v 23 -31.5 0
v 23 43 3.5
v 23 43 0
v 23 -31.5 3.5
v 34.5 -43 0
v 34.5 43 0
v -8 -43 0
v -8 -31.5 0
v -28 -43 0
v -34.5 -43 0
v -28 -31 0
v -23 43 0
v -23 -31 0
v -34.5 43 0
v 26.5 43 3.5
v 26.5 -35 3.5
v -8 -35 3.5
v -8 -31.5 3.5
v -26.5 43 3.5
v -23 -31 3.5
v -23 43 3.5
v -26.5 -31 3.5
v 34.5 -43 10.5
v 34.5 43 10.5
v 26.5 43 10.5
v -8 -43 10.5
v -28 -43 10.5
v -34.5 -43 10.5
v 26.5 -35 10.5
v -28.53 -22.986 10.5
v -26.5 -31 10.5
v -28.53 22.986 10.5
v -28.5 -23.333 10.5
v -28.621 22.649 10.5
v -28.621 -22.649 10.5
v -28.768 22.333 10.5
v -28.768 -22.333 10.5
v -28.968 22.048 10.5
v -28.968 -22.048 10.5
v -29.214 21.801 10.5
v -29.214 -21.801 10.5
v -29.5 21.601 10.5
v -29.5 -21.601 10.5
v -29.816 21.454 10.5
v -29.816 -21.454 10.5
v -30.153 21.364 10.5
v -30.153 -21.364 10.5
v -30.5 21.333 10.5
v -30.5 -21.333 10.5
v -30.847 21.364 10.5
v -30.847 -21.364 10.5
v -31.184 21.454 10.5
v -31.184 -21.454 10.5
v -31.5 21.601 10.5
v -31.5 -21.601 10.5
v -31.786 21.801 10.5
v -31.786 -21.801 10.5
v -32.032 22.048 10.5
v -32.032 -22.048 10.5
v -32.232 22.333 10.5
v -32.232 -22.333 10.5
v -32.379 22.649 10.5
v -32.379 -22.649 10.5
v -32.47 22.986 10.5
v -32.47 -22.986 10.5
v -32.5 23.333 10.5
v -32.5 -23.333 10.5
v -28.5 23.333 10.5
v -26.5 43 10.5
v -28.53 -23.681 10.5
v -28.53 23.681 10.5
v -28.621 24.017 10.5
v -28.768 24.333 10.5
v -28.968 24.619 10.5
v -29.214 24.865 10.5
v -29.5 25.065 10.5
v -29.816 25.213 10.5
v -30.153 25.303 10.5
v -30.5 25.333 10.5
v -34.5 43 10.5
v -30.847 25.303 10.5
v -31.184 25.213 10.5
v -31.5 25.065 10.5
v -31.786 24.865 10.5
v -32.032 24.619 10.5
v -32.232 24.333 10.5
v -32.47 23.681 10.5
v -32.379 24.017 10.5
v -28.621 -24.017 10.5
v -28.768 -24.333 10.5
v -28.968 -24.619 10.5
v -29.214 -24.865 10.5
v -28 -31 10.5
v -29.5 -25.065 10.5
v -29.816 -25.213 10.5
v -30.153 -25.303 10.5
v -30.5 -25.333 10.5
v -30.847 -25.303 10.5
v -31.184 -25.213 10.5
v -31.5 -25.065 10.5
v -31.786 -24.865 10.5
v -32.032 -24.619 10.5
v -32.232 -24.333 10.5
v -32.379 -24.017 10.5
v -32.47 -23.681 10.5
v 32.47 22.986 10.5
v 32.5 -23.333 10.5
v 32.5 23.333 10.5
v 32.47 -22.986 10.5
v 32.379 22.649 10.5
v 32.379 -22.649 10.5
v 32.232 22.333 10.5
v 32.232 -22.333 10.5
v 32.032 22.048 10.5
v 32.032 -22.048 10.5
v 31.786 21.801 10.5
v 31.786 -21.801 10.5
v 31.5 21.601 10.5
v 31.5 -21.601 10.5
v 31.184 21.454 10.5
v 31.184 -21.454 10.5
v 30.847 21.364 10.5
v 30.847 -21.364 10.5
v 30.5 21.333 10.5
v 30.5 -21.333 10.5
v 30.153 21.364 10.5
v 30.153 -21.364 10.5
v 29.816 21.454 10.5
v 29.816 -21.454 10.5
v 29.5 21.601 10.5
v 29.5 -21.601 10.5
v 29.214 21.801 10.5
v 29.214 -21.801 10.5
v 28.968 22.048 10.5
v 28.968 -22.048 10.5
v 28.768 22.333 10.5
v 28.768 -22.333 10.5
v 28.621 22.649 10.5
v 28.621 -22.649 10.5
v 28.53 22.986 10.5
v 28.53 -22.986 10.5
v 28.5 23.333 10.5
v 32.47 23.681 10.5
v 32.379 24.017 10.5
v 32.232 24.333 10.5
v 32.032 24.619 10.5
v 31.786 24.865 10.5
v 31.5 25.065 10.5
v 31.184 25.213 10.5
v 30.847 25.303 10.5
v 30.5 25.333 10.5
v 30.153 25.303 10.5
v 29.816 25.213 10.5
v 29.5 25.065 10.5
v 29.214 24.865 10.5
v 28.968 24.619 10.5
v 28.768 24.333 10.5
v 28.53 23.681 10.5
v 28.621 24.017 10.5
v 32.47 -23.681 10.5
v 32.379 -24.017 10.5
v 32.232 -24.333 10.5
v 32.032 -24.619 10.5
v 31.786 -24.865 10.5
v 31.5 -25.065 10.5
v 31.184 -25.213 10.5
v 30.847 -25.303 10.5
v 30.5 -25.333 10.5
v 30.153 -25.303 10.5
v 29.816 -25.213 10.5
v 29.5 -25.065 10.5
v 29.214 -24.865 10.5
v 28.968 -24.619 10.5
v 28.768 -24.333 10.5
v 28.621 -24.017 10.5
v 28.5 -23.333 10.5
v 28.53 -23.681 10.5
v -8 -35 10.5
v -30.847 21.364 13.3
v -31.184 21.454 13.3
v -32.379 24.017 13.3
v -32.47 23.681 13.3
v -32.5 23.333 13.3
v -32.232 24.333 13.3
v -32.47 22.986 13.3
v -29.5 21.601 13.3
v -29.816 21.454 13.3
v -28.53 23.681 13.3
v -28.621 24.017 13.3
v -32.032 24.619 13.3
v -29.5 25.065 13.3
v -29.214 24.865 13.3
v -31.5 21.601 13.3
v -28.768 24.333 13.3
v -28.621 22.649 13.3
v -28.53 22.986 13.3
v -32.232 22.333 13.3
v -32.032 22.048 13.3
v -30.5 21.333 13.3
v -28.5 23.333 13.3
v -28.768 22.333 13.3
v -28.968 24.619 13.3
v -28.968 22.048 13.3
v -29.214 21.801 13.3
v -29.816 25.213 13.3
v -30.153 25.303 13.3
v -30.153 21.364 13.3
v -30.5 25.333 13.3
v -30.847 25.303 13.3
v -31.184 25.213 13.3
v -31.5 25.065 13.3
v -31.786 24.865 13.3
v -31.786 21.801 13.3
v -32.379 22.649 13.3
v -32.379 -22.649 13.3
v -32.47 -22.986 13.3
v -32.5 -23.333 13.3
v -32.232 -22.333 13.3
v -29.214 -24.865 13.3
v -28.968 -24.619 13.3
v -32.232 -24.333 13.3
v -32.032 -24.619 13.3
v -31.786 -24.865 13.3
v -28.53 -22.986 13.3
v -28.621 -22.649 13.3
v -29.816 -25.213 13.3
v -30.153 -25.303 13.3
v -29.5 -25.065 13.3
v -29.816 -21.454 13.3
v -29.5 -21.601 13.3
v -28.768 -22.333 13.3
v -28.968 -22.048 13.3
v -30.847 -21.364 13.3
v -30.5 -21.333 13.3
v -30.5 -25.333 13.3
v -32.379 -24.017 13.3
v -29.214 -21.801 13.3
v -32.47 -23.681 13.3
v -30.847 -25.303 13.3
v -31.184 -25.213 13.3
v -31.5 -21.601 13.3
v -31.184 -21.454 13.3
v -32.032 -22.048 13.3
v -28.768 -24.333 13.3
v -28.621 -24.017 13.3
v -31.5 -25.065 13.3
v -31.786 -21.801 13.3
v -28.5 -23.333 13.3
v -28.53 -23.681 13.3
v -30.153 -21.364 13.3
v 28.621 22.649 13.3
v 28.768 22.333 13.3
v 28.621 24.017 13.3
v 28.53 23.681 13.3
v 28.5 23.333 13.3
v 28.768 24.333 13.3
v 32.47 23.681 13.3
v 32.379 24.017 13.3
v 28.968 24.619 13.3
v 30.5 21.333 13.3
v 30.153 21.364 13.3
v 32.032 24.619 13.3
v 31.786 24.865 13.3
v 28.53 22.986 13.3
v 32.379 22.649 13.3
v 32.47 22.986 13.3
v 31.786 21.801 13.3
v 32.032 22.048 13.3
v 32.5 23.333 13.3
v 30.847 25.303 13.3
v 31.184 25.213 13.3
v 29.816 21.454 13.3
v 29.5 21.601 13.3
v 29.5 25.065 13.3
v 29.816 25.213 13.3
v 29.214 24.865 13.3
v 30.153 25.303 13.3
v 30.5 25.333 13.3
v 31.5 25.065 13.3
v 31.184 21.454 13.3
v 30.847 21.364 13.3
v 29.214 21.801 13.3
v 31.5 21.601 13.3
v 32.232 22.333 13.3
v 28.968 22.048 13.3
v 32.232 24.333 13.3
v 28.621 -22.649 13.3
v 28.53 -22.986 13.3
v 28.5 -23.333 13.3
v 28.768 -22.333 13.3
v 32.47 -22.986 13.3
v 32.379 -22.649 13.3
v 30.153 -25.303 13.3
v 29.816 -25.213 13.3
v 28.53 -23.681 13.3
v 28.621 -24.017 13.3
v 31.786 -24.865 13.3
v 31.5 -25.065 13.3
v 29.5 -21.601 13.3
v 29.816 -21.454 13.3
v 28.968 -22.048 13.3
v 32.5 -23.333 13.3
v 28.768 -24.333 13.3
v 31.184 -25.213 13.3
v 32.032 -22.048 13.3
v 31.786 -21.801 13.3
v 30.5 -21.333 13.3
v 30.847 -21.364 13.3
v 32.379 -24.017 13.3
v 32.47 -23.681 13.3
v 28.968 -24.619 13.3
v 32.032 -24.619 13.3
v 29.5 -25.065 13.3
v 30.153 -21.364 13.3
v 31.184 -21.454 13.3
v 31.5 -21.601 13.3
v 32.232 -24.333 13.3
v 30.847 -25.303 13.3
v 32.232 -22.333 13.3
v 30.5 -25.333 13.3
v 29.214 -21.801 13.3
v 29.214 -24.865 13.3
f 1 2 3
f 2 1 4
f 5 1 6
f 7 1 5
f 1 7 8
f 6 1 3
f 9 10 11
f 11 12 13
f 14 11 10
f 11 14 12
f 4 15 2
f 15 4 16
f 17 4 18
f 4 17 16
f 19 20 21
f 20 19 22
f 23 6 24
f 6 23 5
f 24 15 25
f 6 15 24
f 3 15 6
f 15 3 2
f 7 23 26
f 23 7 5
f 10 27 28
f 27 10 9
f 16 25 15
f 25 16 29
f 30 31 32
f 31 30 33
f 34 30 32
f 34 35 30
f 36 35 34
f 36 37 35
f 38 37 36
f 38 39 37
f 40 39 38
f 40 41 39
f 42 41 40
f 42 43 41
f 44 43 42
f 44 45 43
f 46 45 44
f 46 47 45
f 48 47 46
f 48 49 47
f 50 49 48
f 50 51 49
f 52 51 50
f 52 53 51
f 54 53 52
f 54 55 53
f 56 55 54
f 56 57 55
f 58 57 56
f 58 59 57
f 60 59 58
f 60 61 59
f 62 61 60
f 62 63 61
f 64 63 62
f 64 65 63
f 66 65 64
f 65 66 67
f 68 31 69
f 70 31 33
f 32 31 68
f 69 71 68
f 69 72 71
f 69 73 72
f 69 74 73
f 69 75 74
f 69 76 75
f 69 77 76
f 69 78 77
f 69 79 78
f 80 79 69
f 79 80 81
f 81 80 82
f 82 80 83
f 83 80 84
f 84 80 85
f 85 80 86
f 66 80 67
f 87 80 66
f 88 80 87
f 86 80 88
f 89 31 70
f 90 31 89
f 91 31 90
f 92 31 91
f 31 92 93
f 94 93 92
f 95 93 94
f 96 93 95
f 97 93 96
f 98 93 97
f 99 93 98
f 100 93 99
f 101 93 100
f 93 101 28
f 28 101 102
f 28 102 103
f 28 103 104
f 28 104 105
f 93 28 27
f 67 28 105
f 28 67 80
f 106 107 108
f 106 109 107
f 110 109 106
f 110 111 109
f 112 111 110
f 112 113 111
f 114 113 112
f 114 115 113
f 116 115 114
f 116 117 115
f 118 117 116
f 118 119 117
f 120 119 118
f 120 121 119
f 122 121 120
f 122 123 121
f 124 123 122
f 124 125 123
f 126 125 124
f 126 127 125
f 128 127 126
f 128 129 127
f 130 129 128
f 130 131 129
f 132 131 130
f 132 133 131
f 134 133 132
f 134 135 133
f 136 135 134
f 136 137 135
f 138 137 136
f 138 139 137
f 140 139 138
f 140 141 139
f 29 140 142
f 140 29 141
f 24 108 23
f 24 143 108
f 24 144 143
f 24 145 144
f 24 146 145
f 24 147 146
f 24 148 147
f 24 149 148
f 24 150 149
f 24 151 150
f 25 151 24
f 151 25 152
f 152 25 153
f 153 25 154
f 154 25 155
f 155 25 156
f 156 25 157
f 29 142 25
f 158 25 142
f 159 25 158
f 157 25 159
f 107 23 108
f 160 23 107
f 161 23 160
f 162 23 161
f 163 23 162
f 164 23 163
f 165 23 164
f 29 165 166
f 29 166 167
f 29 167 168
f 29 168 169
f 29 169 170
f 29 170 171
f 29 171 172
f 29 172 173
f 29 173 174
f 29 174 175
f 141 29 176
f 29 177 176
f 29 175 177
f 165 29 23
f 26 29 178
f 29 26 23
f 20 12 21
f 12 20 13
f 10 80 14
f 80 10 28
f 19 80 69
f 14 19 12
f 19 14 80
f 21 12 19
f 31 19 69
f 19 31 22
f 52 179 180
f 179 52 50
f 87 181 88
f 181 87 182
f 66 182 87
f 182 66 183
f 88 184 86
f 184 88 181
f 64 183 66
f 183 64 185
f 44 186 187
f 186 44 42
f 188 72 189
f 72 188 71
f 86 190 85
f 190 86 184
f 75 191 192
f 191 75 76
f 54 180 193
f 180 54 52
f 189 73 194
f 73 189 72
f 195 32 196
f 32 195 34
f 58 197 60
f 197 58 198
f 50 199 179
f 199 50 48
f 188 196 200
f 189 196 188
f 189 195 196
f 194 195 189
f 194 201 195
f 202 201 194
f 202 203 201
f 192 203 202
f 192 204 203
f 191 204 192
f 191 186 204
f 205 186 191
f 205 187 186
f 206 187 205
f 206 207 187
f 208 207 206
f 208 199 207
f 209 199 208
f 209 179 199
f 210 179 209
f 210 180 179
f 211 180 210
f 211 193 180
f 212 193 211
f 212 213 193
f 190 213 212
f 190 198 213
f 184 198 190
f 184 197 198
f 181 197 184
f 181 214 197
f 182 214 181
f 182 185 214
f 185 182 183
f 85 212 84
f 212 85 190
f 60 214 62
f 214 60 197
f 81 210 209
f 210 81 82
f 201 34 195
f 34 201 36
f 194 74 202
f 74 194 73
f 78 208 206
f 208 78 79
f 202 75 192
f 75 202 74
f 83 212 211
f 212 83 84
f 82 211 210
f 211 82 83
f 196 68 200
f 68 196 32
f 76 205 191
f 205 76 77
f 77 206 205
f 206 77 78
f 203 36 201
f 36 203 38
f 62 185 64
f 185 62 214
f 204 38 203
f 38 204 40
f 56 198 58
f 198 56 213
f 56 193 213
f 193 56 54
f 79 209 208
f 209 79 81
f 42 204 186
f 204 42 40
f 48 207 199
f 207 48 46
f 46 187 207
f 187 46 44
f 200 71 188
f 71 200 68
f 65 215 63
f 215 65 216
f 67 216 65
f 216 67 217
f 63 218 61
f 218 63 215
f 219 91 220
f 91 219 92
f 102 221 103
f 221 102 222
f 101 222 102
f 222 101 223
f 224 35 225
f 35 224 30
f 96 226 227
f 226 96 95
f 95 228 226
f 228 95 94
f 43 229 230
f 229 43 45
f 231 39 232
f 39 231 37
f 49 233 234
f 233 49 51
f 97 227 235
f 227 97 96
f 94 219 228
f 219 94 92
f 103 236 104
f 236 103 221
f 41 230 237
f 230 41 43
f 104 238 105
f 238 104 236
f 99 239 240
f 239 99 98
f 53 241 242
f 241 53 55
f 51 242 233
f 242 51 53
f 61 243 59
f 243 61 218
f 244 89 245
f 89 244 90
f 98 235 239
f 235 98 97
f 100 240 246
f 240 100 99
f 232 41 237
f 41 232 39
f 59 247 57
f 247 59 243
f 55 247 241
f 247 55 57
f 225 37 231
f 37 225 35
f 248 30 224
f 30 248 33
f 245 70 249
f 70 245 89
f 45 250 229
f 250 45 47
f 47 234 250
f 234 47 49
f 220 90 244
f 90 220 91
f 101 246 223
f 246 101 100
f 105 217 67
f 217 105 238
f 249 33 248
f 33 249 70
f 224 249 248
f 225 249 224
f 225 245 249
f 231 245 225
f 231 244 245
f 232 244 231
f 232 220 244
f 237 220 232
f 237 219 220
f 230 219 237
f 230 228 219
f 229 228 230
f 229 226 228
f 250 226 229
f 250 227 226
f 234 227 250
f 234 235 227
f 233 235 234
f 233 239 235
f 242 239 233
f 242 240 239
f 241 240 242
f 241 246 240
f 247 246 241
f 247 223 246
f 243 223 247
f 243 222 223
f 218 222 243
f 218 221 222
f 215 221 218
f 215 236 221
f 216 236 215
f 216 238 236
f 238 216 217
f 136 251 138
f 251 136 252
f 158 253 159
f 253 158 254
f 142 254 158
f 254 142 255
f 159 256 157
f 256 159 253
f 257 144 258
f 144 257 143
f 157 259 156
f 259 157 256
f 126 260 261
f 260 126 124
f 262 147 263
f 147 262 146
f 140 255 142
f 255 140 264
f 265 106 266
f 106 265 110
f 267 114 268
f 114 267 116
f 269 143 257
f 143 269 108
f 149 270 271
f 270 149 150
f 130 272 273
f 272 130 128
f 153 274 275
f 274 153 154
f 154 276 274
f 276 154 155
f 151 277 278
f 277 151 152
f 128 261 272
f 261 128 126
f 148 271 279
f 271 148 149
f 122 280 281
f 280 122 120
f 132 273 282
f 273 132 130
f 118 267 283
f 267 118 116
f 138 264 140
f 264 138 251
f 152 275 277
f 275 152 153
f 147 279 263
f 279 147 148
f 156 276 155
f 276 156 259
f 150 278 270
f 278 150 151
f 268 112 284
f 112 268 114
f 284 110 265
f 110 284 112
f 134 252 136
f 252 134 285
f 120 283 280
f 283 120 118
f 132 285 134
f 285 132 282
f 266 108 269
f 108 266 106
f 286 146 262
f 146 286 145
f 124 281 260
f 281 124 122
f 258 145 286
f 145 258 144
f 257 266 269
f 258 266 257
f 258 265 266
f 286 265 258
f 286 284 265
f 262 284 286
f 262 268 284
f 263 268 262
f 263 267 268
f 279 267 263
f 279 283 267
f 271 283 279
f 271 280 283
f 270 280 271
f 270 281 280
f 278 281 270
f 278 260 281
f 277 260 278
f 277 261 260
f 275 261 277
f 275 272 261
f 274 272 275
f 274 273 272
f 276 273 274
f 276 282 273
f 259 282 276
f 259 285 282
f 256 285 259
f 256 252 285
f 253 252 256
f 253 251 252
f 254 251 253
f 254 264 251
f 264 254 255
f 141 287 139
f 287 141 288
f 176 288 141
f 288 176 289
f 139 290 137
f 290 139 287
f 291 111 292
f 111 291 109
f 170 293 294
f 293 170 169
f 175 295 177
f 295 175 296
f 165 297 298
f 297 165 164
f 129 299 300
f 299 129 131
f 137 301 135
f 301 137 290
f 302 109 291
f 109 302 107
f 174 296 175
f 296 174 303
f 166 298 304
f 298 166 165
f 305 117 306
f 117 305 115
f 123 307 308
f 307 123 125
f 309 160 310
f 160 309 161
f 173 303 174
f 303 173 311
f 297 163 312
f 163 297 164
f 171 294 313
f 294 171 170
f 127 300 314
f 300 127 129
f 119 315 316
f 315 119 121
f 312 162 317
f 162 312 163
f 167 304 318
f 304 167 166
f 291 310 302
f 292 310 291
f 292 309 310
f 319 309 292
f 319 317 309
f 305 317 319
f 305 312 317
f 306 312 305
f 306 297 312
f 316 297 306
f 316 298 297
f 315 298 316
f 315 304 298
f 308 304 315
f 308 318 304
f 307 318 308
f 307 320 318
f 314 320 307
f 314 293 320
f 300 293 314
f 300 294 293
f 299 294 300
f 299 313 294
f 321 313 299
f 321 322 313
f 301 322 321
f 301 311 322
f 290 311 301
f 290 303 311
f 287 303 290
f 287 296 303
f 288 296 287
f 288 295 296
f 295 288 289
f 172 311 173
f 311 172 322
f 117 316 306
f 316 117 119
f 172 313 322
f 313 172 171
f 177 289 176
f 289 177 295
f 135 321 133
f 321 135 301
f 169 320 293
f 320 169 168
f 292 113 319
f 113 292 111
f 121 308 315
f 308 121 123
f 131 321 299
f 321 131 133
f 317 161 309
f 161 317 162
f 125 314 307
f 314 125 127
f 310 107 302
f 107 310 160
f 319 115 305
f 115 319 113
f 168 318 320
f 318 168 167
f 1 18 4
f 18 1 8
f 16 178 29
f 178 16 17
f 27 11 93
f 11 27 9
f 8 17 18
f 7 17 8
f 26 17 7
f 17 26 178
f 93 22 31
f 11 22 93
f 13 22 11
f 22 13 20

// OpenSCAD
//include <iPod_nano_4gen_bike_mount.scad>

$fn=16;
//production=false;

ipod_n4_height=70;        // top to bottom when looking at the display
ipod_n4_width=53;        // left ro right when looking at the display
ipod_n4_edge_radius=5.3; // radius of circle describing the edge's radius

module ipodStandTop(ipx=ipod_n4_width, ipy=ipod_n4_height, width=4, border=8) {
    rotate([0,180,0]) difference() {
        union() {
            // einrastschienen links und rechts
            for(rot=[0:180:180]) {
                rotate([0,0,rot]) union() {
                    translate([(-ipx-border+width)/2,0,-width/2]) cube([border+width, 2*border+ipy, width], center=true);
                    translate([(-ipx-border)/2,0,-3.5-width]) cube([border, 2*border+ipy, 7], center=true);
                }
            }
            // Einrastschienen unten
            translate([0,(-ipy-border+width)/2,-width/2]) cube([ipx+2*border, border+width, width], center=true);
            translate([0,(-ipy-border)/2,-3.5-width]) cube([2*border+ipx, border, 7], center=true);
            // klebelöcher
            translate([0,0,-width-2.8*width]) {
                translate([(ipx+border)/2,ipy/3,  0]) cylinder(r=2, h=width, $fn=36);
                translate([(ipx+border)/2,-ipy/3, 0]) cylinder(r=2, h=width, $fn=36);
                translate([-(ipx+border)/2,ipy/3, 0]) cylinder(r=2, h=width, $fn=36);
                translate([-(ipx+border)/2,-ipy/3,0]) cylinder(r=2, h=width, $fn=36);
            }
        }
        // hole for earplug
        //translate([18,(-ipy+border)/2.05,0]) rotate([90,0,0]) cylinder(r1=9,r2=9,h=3*border, center=false);
        translate([18,(-ipy-border+width)/2,0]) cube([20,border+width+1,50], center=true);
    }
}
ipodStandTop(width=3.5);
